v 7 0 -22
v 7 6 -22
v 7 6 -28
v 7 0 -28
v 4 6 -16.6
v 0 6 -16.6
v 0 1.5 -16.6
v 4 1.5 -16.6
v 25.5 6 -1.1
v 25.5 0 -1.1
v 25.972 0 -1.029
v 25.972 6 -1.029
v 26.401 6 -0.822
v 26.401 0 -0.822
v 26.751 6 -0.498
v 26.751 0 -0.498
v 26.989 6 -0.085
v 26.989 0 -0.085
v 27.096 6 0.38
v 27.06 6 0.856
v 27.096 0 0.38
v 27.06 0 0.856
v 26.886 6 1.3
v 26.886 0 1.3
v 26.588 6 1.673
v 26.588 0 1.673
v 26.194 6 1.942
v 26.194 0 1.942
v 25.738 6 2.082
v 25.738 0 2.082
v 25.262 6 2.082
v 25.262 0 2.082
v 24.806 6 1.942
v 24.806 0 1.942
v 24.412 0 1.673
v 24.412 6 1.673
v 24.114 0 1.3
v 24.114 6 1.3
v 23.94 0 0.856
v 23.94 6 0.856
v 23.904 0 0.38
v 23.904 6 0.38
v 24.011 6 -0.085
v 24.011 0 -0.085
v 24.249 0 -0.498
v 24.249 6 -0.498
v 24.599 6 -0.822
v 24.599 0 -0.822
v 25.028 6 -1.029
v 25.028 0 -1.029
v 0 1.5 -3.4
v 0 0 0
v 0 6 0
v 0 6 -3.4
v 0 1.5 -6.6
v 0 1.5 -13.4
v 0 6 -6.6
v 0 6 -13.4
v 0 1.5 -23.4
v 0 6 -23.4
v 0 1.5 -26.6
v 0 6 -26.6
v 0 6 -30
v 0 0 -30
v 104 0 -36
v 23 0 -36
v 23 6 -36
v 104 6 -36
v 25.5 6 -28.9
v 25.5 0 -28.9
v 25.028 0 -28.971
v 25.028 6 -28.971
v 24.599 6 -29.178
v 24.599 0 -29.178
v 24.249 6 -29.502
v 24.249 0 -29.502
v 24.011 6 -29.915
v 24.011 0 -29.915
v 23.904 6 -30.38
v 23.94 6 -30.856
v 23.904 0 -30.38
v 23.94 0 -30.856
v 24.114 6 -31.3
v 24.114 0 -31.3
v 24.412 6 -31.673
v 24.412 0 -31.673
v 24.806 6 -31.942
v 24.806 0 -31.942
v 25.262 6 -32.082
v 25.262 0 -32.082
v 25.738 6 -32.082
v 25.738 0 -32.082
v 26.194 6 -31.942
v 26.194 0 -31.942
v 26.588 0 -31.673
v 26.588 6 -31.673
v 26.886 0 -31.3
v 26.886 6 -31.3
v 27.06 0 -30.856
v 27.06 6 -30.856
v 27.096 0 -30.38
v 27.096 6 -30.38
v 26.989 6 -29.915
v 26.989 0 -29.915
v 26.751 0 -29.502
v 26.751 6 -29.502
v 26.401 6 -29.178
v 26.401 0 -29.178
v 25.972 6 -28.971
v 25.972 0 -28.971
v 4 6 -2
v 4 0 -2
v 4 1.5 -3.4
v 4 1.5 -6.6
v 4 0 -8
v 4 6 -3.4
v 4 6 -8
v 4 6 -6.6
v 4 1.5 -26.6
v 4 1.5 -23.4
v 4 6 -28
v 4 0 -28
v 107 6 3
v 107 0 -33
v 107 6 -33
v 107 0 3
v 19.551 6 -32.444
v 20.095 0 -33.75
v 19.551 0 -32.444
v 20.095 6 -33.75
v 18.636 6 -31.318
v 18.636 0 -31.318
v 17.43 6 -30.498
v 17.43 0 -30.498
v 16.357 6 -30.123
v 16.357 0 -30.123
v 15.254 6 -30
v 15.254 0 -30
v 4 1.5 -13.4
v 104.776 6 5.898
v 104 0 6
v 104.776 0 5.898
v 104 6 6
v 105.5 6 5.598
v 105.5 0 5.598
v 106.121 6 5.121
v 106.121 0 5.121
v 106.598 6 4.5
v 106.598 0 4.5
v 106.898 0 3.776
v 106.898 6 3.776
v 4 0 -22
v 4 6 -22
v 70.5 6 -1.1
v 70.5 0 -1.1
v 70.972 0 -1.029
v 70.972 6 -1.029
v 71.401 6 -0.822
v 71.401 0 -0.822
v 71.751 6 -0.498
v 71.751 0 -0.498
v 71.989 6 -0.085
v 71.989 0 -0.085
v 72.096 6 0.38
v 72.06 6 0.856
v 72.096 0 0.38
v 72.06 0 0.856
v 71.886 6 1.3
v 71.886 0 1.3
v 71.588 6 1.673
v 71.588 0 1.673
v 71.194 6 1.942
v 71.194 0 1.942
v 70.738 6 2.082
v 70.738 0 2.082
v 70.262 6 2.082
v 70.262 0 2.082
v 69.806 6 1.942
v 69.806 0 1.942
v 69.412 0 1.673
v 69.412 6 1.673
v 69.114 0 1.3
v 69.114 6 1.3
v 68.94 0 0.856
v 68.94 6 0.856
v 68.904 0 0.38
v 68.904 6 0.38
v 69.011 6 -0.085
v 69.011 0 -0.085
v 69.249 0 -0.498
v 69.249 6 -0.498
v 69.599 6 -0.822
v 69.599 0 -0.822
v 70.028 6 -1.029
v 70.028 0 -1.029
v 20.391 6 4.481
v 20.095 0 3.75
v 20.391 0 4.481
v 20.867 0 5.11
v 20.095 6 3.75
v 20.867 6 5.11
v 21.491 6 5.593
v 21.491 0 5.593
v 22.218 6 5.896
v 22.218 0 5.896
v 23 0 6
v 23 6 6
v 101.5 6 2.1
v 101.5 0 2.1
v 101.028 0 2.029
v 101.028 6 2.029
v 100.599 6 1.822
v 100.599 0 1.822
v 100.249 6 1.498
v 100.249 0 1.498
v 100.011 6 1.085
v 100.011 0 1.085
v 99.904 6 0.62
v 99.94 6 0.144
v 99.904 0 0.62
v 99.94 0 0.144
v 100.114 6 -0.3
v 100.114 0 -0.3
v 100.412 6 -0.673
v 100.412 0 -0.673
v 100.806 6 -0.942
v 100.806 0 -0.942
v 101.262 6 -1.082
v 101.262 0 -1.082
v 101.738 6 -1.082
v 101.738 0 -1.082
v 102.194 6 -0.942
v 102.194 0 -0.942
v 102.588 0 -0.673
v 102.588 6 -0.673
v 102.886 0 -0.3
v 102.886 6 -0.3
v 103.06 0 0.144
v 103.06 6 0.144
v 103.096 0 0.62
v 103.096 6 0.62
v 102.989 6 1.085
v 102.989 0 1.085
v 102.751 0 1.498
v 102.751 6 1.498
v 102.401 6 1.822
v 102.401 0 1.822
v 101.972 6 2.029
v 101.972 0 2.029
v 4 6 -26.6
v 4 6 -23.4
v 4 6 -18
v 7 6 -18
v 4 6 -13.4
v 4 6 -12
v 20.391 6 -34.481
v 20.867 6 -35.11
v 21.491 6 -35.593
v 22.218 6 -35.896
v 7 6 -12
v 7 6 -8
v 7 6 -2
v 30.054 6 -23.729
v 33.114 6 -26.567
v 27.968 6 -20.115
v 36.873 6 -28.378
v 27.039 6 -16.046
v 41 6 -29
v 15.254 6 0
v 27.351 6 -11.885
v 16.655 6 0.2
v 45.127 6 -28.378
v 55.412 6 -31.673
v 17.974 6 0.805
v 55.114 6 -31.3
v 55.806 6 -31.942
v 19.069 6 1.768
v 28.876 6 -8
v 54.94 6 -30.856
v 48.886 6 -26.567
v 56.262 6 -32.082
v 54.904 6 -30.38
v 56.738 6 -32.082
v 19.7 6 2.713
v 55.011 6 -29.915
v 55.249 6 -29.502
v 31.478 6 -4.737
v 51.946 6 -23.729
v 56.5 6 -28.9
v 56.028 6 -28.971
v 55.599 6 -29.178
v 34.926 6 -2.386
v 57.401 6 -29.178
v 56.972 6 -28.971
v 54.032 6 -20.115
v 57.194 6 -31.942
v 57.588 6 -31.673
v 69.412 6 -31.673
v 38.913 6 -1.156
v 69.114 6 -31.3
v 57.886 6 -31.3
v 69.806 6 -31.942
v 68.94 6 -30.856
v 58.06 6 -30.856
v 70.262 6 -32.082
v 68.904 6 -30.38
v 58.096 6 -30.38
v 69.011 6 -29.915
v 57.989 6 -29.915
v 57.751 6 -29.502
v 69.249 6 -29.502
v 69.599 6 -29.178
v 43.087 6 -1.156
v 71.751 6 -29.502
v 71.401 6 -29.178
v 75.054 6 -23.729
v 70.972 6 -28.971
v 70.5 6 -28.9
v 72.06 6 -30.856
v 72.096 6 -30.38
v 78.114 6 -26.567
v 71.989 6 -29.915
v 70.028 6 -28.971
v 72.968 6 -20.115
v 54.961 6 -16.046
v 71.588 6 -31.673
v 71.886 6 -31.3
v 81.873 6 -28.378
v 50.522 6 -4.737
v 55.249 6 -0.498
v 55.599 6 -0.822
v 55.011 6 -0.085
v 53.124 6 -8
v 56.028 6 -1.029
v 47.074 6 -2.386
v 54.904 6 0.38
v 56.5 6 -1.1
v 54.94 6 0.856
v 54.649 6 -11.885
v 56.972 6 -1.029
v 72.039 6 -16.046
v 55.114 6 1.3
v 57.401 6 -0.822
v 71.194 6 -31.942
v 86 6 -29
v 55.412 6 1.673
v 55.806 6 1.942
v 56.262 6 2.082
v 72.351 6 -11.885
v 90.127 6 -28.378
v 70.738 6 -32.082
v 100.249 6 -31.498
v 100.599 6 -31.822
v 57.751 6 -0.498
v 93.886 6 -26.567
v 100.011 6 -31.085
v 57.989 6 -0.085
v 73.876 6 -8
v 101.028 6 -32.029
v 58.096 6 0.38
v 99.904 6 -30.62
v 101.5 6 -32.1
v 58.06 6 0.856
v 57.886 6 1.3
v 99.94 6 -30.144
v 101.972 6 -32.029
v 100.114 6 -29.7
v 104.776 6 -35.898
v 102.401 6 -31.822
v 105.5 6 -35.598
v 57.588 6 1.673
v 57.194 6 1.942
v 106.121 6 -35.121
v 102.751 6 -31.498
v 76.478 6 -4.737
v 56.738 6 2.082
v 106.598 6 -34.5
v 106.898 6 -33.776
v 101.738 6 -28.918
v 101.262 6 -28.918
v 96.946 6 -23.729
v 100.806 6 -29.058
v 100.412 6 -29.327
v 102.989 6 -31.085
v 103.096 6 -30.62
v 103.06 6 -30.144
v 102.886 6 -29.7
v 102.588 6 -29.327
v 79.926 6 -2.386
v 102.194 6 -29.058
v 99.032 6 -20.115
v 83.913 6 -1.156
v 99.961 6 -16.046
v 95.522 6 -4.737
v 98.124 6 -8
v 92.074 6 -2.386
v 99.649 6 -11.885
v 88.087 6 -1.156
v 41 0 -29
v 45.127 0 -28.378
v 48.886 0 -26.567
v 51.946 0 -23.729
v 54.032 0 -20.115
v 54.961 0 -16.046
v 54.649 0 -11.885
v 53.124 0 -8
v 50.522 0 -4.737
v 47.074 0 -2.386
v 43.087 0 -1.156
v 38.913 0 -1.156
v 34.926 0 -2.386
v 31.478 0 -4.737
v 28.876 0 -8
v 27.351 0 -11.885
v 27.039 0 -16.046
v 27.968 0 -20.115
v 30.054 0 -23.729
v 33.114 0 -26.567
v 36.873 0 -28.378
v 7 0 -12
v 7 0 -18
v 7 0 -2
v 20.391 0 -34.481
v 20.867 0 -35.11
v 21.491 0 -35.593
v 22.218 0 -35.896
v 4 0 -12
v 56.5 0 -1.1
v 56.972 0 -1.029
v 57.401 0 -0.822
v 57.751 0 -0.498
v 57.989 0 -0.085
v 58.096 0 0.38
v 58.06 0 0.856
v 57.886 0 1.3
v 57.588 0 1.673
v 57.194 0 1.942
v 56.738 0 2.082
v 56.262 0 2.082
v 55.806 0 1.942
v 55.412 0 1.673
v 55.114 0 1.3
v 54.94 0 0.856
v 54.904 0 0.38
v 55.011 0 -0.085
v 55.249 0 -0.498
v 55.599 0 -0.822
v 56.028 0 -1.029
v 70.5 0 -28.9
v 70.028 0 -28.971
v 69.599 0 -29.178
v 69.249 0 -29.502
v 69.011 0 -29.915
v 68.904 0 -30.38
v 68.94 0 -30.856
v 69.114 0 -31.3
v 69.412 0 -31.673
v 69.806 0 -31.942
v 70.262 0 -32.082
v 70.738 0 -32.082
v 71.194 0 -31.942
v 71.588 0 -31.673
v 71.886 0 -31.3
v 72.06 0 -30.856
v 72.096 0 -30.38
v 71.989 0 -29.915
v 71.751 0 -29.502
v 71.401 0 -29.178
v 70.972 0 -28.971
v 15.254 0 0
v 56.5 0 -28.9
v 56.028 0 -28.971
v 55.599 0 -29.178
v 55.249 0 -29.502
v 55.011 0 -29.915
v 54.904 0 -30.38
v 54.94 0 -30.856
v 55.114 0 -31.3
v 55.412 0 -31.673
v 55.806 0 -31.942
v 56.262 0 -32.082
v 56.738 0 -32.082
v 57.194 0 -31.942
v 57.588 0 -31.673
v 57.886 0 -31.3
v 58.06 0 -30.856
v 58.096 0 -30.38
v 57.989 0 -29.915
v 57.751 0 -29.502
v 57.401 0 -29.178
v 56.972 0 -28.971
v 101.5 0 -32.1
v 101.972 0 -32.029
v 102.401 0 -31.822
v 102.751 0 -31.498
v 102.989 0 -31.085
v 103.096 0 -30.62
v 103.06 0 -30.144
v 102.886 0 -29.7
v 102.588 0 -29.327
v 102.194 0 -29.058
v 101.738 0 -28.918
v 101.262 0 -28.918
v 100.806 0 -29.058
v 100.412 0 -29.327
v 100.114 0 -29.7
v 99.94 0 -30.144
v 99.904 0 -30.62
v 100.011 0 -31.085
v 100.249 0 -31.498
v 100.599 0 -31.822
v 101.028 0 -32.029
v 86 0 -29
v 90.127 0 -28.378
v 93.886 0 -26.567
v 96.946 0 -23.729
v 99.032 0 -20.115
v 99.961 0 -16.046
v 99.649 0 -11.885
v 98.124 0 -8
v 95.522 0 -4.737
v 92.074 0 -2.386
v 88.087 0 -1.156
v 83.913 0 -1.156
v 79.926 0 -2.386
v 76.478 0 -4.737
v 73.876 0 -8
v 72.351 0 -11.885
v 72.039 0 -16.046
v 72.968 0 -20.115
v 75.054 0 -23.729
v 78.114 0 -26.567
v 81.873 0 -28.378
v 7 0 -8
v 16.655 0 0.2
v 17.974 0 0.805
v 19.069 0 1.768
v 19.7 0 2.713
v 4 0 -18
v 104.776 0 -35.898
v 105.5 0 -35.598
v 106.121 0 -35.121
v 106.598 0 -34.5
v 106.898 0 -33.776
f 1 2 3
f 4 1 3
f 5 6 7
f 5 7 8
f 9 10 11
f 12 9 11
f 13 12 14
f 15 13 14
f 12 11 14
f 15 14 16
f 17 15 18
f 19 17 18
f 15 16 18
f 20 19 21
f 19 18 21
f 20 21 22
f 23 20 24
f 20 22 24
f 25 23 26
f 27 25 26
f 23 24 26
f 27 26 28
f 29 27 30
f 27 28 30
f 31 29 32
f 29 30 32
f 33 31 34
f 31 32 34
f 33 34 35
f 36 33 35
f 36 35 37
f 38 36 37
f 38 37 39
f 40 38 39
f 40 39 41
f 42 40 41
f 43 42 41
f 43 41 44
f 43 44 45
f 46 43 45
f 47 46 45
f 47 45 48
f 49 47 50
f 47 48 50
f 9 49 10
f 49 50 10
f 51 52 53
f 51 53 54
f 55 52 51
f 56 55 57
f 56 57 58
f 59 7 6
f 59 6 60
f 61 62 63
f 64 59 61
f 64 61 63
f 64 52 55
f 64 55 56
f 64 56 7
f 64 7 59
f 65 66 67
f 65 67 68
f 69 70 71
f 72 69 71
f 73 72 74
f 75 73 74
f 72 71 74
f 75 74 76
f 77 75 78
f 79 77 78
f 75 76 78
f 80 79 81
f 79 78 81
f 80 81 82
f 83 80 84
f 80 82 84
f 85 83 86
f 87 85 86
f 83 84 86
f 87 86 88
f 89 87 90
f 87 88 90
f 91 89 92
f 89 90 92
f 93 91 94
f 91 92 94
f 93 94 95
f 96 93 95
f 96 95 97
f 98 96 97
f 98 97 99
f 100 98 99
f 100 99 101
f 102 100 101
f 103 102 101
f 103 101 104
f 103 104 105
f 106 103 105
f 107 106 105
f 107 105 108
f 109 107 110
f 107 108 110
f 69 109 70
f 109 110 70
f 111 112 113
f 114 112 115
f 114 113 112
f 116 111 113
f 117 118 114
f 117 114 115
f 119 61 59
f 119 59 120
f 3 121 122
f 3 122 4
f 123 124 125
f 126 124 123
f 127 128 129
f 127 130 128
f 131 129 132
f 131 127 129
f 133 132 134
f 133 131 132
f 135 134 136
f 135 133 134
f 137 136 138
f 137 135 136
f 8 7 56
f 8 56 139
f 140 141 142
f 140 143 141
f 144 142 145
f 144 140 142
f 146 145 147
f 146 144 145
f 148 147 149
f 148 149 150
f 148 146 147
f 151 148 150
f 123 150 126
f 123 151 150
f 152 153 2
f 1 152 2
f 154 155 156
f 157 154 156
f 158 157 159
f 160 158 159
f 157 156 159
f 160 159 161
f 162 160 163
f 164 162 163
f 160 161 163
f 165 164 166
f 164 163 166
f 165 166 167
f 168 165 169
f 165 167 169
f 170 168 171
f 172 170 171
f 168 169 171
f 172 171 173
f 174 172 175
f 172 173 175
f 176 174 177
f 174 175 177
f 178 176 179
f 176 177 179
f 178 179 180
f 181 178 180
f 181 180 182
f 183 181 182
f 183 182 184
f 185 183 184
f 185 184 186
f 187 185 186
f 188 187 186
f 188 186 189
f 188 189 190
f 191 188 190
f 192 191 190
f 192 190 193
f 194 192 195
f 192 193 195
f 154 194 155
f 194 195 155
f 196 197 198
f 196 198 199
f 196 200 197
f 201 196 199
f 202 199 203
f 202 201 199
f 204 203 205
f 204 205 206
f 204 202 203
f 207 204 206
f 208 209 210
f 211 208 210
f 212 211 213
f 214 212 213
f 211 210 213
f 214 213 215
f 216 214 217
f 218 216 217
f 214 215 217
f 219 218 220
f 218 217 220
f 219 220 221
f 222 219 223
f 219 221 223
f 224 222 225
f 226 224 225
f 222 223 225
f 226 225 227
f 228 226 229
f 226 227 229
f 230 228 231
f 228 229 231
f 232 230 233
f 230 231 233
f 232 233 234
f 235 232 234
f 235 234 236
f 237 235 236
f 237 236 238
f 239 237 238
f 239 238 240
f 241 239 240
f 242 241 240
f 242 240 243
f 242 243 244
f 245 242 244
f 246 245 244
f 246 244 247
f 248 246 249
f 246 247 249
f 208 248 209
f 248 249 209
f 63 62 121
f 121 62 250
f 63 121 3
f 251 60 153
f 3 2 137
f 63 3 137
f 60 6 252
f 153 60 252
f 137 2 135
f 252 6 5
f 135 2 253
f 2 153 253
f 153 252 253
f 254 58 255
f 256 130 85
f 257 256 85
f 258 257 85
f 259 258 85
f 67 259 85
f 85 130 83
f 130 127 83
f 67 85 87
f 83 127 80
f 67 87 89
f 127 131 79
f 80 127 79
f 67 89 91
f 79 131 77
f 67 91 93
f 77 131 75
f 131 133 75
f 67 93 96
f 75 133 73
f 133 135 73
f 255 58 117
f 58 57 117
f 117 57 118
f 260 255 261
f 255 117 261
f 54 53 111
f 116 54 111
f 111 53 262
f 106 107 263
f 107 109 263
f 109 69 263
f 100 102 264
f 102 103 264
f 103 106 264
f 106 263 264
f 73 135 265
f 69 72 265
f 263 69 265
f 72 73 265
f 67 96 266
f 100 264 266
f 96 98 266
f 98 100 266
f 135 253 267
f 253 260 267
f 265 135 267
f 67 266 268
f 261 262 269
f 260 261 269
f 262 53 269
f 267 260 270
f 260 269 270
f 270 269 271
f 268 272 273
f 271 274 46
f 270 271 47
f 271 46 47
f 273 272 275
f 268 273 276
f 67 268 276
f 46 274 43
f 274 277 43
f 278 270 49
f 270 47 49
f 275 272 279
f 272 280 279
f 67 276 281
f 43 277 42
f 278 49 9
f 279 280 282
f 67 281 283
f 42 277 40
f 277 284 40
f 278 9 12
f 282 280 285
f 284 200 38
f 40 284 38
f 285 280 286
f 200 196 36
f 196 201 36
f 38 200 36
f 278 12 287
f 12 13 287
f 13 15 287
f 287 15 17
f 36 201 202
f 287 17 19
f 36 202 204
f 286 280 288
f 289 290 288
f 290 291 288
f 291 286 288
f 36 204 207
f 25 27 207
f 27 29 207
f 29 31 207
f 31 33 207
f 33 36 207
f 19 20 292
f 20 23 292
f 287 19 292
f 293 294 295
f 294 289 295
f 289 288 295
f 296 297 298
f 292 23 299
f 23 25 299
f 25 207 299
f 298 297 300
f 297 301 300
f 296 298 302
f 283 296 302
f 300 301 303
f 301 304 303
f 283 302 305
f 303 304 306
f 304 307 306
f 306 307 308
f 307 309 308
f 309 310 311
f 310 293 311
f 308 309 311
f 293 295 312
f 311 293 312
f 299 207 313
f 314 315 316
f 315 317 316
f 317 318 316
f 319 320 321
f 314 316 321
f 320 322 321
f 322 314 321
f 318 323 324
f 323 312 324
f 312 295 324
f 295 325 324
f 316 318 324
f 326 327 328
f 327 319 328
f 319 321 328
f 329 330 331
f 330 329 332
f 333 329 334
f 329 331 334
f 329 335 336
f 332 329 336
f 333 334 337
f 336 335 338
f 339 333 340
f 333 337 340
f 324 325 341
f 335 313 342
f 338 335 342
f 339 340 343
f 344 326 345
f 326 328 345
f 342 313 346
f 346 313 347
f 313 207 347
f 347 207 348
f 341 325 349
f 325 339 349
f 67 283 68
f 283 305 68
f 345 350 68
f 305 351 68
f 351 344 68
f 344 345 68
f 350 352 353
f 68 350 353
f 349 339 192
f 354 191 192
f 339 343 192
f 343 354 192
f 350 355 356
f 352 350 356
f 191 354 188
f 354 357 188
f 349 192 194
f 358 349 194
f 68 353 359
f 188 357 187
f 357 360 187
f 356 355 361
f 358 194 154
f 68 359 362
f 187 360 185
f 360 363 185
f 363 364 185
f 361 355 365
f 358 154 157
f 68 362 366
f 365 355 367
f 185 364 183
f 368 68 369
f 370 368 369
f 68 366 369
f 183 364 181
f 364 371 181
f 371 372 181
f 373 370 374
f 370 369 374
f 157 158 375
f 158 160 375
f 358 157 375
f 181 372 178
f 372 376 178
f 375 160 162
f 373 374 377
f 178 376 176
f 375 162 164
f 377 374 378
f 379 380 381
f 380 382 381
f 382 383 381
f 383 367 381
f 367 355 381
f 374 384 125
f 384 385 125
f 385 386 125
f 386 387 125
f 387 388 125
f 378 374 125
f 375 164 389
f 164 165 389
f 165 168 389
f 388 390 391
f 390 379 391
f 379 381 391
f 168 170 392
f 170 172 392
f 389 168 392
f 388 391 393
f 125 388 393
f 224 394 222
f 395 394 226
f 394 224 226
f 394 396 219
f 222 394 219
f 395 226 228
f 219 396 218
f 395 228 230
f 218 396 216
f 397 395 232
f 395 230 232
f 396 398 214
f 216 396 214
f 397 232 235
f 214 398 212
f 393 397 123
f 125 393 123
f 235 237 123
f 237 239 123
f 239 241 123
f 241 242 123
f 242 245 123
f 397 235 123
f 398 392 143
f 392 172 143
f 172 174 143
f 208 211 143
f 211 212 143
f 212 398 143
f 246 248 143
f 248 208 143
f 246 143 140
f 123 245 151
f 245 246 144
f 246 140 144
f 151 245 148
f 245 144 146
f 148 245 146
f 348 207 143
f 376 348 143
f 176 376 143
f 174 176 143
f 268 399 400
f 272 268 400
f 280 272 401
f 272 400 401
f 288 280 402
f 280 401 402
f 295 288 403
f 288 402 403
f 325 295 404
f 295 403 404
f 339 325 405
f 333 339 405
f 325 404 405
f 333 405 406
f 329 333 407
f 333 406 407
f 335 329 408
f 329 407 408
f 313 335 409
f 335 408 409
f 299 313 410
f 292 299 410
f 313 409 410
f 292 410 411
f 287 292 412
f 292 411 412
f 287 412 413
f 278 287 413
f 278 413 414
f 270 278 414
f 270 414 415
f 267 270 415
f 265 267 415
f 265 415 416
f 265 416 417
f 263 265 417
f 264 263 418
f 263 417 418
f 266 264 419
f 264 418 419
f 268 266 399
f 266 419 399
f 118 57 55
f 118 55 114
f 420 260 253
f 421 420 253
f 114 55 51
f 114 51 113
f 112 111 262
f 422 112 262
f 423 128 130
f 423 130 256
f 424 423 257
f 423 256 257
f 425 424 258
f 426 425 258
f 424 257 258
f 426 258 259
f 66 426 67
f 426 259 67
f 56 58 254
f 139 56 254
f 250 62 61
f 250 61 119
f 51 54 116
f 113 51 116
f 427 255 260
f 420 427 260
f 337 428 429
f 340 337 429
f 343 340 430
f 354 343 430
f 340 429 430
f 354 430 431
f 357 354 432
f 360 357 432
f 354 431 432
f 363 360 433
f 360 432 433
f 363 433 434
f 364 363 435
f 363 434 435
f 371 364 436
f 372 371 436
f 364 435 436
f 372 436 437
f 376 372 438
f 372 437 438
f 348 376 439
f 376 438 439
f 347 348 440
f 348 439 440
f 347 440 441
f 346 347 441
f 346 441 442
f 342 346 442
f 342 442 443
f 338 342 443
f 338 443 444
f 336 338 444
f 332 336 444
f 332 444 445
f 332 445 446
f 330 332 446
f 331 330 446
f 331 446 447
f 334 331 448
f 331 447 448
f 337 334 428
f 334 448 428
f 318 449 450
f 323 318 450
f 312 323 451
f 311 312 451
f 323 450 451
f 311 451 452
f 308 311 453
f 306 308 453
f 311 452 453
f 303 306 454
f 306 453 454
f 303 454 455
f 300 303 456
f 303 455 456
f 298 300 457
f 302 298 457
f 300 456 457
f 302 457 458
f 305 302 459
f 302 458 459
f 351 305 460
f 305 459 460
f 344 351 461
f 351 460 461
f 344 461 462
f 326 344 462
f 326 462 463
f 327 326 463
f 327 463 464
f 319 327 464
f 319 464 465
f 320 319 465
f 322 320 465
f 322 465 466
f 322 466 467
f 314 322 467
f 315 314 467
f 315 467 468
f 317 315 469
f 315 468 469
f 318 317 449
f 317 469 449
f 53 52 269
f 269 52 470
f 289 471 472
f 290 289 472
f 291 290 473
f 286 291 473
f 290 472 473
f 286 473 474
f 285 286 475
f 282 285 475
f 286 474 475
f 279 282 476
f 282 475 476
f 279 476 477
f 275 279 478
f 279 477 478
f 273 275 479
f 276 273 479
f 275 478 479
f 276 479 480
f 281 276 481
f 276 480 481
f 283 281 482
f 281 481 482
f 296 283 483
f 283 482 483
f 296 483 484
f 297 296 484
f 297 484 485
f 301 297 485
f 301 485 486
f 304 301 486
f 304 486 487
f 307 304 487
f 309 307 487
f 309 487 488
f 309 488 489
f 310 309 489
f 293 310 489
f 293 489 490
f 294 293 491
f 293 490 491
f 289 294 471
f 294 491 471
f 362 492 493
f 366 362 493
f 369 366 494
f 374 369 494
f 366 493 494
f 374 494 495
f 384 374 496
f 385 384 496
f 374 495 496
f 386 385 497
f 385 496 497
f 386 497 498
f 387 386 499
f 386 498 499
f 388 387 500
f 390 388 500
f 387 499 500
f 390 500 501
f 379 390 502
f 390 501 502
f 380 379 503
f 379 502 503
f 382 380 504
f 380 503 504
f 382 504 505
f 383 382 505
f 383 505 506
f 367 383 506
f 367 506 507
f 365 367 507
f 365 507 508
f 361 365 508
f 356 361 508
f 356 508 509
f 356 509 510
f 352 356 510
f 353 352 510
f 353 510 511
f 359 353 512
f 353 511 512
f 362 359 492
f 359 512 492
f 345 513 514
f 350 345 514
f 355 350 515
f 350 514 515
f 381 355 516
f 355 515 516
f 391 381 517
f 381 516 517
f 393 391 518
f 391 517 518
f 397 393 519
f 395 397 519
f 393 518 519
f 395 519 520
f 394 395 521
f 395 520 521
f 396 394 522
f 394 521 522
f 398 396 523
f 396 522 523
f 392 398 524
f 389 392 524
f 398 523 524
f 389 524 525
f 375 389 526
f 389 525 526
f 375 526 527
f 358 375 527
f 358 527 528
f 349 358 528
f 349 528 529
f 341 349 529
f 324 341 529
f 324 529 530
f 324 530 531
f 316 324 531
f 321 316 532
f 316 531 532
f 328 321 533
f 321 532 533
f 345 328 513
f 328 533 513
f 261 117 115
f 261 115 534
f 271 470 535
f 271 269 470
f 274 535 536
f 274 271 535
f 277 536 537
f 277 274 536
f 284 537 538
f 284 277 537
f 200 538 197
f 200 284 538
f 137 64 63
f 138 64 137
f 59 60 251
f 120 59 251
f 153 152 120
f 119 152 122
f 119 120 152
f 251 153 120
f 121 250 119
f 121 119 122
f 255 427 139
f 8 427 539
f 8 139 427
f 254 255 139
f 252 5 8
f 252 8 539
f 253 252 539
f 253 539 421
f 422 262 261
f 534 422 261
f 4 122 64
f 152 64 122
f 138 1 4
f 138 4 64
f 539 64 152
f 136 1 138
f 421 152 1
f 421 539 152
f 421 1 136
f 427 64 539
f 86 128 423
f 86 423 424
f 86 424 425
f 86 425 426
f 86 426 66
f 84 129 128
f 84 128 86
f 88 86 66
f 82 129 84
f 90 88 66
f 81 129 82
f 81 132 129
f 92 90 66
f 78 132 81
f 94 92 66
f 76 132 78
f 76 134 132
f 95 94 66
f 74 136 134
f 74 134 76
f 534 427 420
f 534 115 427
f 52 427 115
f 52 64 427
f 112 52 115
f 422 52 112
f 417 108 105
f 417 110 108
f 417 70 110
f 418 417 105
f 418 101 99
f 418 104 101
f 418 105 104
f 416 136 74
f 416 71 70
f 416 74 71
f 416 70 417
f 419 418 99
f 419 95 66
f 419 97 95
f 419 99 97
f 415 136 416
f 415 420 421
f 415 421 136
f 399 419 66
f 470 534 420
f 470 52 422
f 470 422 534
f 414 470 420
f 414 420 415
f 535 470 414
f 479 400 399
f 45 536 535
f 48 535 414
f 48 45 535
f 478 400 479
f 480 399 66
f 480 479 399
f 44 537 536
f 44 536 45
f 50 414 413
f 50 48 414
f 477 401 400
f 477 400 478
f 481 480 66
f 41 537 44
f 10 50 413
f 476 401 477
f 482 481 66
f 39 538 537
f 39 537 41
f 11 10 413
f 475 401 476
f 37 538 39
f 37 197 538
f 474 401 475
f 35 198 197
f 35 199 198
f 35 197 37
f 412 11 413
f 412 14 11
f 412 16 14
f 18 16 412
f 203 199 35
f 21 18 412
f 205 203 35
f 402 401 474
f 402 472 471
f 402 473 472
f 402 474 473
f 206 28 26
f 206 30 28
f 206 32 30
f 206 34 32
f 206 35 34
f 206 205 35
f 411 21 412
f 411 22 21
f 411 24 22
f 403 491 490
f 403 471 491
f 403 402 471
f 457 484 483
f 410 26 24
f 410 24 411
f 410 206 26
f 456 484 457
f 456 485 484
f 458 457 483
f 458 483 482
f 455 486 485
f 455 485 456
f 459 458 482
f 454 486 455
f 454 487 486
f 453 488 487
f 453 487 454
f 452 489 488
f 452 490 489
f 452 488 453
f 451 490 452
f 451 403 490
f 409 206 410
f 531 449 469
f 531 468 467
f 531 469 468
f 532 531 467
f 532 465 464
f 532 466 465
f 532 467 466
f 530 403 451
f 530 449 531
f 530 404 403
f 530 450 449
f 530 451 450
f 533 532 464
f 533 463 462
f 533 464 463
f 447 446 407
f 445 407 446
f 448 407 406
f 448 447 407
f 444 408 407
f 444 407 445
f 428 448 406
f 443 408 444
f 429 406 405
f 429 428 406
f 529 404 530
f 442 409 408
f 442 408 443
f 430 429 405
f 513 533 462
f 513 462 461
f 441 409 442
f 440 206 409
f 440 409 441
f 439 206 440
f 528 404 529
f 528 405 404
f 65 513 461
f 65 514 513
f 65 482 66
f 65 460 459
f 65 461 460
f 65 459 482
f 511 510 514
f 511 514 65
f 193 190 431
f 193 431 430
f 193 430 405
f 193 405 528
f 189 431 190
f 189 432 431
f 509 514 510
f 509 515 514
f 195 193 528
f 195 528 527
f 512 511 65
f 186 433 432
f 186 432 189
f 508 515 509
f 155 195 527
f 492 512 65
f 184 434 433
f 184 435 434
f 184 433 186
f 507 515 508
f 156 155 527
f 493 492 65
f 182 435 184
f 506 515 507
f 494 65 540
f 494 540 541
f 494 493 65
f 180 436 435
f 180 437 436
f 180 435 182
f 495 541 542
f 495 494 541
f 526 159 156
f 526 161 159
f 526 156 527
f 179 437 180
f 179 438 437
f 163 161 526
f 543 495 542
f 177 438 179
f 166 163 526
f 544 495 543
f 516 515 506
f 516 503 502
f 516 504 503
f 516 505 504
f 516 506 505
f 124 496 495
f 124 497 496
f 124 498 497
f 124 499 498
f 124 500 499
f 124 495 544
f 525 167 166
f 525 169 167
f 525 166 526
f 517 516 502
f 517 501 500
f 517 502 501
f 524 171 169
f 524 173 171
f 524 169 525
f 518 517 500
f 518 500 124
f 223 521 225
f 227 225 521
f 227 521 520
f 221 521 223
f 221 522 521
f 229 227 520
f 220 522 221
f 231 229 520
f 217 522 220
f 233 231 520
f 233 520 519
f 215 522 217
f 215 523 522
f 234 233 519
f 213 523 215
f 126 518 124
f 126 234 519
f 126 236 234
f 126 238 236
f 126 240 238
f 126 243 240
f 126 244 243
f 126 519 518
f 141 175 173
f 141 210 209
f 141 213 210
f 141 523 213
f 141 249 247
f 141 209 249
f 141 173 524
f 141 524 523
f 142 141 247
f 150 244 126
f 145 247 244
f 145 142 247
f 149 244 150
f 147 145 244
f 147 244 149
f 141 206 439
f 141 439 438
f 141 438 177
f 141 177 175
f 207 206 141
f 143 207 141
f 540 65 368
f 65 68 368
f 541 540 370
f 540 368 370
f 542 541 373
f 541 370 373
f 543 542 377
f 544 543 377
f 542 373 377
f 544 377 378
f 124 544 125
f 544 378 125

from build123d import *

# Parameters (mm, degrees)
SKETCH_1_W          = 20
SKETCH_1_H          = 30
EXTRUDE_1_DEPTH     = 6
SKETCH_2_W          = 4
SKETCH_2_H          = 3.2
CUT_EXTRUDE_1_DEPTH = 4.5
SKETCH_3_W          = 3
SKETCH_3_H          = 6
CUT_EXTRUDE_2_DEPTH = 14.5
SKETCH_4_W          = 87
SKETCH_4_H          = 42
SKETCH_4_R          = 1.6
SKETCH_4_R_2        = 14
EXTRUDE_2_DEPTH     = 6
FILLET_1_R          = 3
FILLET_2_R          = 5


with BuildPart() as part:
    # 草图1 → 凸台-拉伸1 (new body)
    with BuildSketch(Plane(origin=(0, 0, 0), x_dir=(1, 0, 0), z_dir=(0, 1, 0))):
        with Locations((10, 15)):
            Rectangle(SKETCH_1_W, SKETCH_1_H)
    extrude(amount=EXTRUDE_1_DEPTH)

    # 草图2 → 切除-拉伸1 (cut)
    with BuildSketch(Plane(origin=(0, 6, 0), x_dir=(1, 0, 0), z_dir=(0, 1, 0))):
        with Locations((2, 5)):
            Rectangle(SKETCH_2_W, SKETCH_2_H)
        with Locations((2, 15)):
            Rectangle(SKETCH_2_W, SKETCH_2_H)
        with Locations((2, 25)):
            Rectangle(SKETCH_2_W, SKETCH_2_H)
    extrude(amount=-CUT_EXTRUDE_1_DEPTH, mode=Mode.SUBTRACT)

    # 草图3 → 切除-拉伸2 (cut)
    with BuildSketch(Plane(origin=(0, 6, 0), x_dir=(1, 0, 0), z_dir=(0, 1, 0))):
        with Locations((5.5, 5)):
            Rectangle(SKETCH_3_W, SKETCH_3_H)
        with Locations((5.5, 15)):
            Rectangle(SKETCH_3_W, SKETCH_3_H)
        with Locations((5.5, 25)):
            Rectangle(SKETCH_3_W, SKETCH_3_H)
    extrude(amount=-CUT_EXTRUDE_2_DEPTH, mode=Mode.SUBTRACT)

    # 草图4 → 凸台-拉伸2 (add)
    with BuildSketch(Plane.XZ):
        with Locations((63.5, -15)):
            Rectangle(SKETCH_4_W, SKETCH_4_H)
        with Locations(Location((25.5, 0.5, 0), (0, 0, 270))):
            Circle(SKETCH_4_R, mode=Mode.SUBTRACT)
        with Locations(Location((25.5, -30.5, 0), (0, 0, 90))):
            Circle(SKETCH_4_R, mode=Mode.SUBTRACT)
        with Locations(Location((56.5, -30.5, 0), (0, 0, 90))):
            Circle(SKETCH_4_R, mode=Mode.SUBTRACT)
        with Locations(Location((56.5, 0.5, 0), (0, 0, 270))):
            Circle(SKETCH_4_R, mode=Mode.SUBTRACT)
        with Locations(Location((41, -15, 0), (0, 0, 270))):
            Circle(SKETCH_4_R_2, mode=Mode.SUBTRACT)
        with Locations(Location((86, -15, 0), (0, 0, 270))):
            Circle(SKETCH_4_R_2, mode=Mode.SUBTRACT)
        with Locations(Location((70.5, 0.5, 0), (0, 0, 270))):
            Circle(SKETCH_4_R, mode=Mode.SUBTRACT)
        with Locations(Location((101.5, 0.5, 0), (0, 0, 90))):
            Circle(SKETCH_4_R, mode=Mode.SUBTRACT)
        with Locations(Location((101.5, -30.5, 0), (0, 0, 270))):
            Circle(SKETCH_4_R, mode=Mode.SUBTRACT)
        with Locations(Location((70.5, -30.5, 0), (0, 0, 90))):
            Circle(SKETCH_4_R, mode=Mode.SUBTRACT)
    extrude(amount=-EXTRUDE_2_DEPTH)

    # 圆角1
    fillet_1_edges = [part.edges().sort_by_distance(p)[0] for p in [
        (20, 3, -36),
        (107, 3, 6),
        (107, 3, -36),
        (20, 3, 6),
    ]]
    fillet(fillet_1_edges, radius=FILLET_1_R)

    # 圆角2
    fillet_2_edges = [part.edges().sort_by_distance(p)[0] for p in [
        (20, 3, -30),
        (20, 3, 0),
    ]]
    fillet(fillet_2_edges, radius=FILLET_2_R)


solid = part.part
